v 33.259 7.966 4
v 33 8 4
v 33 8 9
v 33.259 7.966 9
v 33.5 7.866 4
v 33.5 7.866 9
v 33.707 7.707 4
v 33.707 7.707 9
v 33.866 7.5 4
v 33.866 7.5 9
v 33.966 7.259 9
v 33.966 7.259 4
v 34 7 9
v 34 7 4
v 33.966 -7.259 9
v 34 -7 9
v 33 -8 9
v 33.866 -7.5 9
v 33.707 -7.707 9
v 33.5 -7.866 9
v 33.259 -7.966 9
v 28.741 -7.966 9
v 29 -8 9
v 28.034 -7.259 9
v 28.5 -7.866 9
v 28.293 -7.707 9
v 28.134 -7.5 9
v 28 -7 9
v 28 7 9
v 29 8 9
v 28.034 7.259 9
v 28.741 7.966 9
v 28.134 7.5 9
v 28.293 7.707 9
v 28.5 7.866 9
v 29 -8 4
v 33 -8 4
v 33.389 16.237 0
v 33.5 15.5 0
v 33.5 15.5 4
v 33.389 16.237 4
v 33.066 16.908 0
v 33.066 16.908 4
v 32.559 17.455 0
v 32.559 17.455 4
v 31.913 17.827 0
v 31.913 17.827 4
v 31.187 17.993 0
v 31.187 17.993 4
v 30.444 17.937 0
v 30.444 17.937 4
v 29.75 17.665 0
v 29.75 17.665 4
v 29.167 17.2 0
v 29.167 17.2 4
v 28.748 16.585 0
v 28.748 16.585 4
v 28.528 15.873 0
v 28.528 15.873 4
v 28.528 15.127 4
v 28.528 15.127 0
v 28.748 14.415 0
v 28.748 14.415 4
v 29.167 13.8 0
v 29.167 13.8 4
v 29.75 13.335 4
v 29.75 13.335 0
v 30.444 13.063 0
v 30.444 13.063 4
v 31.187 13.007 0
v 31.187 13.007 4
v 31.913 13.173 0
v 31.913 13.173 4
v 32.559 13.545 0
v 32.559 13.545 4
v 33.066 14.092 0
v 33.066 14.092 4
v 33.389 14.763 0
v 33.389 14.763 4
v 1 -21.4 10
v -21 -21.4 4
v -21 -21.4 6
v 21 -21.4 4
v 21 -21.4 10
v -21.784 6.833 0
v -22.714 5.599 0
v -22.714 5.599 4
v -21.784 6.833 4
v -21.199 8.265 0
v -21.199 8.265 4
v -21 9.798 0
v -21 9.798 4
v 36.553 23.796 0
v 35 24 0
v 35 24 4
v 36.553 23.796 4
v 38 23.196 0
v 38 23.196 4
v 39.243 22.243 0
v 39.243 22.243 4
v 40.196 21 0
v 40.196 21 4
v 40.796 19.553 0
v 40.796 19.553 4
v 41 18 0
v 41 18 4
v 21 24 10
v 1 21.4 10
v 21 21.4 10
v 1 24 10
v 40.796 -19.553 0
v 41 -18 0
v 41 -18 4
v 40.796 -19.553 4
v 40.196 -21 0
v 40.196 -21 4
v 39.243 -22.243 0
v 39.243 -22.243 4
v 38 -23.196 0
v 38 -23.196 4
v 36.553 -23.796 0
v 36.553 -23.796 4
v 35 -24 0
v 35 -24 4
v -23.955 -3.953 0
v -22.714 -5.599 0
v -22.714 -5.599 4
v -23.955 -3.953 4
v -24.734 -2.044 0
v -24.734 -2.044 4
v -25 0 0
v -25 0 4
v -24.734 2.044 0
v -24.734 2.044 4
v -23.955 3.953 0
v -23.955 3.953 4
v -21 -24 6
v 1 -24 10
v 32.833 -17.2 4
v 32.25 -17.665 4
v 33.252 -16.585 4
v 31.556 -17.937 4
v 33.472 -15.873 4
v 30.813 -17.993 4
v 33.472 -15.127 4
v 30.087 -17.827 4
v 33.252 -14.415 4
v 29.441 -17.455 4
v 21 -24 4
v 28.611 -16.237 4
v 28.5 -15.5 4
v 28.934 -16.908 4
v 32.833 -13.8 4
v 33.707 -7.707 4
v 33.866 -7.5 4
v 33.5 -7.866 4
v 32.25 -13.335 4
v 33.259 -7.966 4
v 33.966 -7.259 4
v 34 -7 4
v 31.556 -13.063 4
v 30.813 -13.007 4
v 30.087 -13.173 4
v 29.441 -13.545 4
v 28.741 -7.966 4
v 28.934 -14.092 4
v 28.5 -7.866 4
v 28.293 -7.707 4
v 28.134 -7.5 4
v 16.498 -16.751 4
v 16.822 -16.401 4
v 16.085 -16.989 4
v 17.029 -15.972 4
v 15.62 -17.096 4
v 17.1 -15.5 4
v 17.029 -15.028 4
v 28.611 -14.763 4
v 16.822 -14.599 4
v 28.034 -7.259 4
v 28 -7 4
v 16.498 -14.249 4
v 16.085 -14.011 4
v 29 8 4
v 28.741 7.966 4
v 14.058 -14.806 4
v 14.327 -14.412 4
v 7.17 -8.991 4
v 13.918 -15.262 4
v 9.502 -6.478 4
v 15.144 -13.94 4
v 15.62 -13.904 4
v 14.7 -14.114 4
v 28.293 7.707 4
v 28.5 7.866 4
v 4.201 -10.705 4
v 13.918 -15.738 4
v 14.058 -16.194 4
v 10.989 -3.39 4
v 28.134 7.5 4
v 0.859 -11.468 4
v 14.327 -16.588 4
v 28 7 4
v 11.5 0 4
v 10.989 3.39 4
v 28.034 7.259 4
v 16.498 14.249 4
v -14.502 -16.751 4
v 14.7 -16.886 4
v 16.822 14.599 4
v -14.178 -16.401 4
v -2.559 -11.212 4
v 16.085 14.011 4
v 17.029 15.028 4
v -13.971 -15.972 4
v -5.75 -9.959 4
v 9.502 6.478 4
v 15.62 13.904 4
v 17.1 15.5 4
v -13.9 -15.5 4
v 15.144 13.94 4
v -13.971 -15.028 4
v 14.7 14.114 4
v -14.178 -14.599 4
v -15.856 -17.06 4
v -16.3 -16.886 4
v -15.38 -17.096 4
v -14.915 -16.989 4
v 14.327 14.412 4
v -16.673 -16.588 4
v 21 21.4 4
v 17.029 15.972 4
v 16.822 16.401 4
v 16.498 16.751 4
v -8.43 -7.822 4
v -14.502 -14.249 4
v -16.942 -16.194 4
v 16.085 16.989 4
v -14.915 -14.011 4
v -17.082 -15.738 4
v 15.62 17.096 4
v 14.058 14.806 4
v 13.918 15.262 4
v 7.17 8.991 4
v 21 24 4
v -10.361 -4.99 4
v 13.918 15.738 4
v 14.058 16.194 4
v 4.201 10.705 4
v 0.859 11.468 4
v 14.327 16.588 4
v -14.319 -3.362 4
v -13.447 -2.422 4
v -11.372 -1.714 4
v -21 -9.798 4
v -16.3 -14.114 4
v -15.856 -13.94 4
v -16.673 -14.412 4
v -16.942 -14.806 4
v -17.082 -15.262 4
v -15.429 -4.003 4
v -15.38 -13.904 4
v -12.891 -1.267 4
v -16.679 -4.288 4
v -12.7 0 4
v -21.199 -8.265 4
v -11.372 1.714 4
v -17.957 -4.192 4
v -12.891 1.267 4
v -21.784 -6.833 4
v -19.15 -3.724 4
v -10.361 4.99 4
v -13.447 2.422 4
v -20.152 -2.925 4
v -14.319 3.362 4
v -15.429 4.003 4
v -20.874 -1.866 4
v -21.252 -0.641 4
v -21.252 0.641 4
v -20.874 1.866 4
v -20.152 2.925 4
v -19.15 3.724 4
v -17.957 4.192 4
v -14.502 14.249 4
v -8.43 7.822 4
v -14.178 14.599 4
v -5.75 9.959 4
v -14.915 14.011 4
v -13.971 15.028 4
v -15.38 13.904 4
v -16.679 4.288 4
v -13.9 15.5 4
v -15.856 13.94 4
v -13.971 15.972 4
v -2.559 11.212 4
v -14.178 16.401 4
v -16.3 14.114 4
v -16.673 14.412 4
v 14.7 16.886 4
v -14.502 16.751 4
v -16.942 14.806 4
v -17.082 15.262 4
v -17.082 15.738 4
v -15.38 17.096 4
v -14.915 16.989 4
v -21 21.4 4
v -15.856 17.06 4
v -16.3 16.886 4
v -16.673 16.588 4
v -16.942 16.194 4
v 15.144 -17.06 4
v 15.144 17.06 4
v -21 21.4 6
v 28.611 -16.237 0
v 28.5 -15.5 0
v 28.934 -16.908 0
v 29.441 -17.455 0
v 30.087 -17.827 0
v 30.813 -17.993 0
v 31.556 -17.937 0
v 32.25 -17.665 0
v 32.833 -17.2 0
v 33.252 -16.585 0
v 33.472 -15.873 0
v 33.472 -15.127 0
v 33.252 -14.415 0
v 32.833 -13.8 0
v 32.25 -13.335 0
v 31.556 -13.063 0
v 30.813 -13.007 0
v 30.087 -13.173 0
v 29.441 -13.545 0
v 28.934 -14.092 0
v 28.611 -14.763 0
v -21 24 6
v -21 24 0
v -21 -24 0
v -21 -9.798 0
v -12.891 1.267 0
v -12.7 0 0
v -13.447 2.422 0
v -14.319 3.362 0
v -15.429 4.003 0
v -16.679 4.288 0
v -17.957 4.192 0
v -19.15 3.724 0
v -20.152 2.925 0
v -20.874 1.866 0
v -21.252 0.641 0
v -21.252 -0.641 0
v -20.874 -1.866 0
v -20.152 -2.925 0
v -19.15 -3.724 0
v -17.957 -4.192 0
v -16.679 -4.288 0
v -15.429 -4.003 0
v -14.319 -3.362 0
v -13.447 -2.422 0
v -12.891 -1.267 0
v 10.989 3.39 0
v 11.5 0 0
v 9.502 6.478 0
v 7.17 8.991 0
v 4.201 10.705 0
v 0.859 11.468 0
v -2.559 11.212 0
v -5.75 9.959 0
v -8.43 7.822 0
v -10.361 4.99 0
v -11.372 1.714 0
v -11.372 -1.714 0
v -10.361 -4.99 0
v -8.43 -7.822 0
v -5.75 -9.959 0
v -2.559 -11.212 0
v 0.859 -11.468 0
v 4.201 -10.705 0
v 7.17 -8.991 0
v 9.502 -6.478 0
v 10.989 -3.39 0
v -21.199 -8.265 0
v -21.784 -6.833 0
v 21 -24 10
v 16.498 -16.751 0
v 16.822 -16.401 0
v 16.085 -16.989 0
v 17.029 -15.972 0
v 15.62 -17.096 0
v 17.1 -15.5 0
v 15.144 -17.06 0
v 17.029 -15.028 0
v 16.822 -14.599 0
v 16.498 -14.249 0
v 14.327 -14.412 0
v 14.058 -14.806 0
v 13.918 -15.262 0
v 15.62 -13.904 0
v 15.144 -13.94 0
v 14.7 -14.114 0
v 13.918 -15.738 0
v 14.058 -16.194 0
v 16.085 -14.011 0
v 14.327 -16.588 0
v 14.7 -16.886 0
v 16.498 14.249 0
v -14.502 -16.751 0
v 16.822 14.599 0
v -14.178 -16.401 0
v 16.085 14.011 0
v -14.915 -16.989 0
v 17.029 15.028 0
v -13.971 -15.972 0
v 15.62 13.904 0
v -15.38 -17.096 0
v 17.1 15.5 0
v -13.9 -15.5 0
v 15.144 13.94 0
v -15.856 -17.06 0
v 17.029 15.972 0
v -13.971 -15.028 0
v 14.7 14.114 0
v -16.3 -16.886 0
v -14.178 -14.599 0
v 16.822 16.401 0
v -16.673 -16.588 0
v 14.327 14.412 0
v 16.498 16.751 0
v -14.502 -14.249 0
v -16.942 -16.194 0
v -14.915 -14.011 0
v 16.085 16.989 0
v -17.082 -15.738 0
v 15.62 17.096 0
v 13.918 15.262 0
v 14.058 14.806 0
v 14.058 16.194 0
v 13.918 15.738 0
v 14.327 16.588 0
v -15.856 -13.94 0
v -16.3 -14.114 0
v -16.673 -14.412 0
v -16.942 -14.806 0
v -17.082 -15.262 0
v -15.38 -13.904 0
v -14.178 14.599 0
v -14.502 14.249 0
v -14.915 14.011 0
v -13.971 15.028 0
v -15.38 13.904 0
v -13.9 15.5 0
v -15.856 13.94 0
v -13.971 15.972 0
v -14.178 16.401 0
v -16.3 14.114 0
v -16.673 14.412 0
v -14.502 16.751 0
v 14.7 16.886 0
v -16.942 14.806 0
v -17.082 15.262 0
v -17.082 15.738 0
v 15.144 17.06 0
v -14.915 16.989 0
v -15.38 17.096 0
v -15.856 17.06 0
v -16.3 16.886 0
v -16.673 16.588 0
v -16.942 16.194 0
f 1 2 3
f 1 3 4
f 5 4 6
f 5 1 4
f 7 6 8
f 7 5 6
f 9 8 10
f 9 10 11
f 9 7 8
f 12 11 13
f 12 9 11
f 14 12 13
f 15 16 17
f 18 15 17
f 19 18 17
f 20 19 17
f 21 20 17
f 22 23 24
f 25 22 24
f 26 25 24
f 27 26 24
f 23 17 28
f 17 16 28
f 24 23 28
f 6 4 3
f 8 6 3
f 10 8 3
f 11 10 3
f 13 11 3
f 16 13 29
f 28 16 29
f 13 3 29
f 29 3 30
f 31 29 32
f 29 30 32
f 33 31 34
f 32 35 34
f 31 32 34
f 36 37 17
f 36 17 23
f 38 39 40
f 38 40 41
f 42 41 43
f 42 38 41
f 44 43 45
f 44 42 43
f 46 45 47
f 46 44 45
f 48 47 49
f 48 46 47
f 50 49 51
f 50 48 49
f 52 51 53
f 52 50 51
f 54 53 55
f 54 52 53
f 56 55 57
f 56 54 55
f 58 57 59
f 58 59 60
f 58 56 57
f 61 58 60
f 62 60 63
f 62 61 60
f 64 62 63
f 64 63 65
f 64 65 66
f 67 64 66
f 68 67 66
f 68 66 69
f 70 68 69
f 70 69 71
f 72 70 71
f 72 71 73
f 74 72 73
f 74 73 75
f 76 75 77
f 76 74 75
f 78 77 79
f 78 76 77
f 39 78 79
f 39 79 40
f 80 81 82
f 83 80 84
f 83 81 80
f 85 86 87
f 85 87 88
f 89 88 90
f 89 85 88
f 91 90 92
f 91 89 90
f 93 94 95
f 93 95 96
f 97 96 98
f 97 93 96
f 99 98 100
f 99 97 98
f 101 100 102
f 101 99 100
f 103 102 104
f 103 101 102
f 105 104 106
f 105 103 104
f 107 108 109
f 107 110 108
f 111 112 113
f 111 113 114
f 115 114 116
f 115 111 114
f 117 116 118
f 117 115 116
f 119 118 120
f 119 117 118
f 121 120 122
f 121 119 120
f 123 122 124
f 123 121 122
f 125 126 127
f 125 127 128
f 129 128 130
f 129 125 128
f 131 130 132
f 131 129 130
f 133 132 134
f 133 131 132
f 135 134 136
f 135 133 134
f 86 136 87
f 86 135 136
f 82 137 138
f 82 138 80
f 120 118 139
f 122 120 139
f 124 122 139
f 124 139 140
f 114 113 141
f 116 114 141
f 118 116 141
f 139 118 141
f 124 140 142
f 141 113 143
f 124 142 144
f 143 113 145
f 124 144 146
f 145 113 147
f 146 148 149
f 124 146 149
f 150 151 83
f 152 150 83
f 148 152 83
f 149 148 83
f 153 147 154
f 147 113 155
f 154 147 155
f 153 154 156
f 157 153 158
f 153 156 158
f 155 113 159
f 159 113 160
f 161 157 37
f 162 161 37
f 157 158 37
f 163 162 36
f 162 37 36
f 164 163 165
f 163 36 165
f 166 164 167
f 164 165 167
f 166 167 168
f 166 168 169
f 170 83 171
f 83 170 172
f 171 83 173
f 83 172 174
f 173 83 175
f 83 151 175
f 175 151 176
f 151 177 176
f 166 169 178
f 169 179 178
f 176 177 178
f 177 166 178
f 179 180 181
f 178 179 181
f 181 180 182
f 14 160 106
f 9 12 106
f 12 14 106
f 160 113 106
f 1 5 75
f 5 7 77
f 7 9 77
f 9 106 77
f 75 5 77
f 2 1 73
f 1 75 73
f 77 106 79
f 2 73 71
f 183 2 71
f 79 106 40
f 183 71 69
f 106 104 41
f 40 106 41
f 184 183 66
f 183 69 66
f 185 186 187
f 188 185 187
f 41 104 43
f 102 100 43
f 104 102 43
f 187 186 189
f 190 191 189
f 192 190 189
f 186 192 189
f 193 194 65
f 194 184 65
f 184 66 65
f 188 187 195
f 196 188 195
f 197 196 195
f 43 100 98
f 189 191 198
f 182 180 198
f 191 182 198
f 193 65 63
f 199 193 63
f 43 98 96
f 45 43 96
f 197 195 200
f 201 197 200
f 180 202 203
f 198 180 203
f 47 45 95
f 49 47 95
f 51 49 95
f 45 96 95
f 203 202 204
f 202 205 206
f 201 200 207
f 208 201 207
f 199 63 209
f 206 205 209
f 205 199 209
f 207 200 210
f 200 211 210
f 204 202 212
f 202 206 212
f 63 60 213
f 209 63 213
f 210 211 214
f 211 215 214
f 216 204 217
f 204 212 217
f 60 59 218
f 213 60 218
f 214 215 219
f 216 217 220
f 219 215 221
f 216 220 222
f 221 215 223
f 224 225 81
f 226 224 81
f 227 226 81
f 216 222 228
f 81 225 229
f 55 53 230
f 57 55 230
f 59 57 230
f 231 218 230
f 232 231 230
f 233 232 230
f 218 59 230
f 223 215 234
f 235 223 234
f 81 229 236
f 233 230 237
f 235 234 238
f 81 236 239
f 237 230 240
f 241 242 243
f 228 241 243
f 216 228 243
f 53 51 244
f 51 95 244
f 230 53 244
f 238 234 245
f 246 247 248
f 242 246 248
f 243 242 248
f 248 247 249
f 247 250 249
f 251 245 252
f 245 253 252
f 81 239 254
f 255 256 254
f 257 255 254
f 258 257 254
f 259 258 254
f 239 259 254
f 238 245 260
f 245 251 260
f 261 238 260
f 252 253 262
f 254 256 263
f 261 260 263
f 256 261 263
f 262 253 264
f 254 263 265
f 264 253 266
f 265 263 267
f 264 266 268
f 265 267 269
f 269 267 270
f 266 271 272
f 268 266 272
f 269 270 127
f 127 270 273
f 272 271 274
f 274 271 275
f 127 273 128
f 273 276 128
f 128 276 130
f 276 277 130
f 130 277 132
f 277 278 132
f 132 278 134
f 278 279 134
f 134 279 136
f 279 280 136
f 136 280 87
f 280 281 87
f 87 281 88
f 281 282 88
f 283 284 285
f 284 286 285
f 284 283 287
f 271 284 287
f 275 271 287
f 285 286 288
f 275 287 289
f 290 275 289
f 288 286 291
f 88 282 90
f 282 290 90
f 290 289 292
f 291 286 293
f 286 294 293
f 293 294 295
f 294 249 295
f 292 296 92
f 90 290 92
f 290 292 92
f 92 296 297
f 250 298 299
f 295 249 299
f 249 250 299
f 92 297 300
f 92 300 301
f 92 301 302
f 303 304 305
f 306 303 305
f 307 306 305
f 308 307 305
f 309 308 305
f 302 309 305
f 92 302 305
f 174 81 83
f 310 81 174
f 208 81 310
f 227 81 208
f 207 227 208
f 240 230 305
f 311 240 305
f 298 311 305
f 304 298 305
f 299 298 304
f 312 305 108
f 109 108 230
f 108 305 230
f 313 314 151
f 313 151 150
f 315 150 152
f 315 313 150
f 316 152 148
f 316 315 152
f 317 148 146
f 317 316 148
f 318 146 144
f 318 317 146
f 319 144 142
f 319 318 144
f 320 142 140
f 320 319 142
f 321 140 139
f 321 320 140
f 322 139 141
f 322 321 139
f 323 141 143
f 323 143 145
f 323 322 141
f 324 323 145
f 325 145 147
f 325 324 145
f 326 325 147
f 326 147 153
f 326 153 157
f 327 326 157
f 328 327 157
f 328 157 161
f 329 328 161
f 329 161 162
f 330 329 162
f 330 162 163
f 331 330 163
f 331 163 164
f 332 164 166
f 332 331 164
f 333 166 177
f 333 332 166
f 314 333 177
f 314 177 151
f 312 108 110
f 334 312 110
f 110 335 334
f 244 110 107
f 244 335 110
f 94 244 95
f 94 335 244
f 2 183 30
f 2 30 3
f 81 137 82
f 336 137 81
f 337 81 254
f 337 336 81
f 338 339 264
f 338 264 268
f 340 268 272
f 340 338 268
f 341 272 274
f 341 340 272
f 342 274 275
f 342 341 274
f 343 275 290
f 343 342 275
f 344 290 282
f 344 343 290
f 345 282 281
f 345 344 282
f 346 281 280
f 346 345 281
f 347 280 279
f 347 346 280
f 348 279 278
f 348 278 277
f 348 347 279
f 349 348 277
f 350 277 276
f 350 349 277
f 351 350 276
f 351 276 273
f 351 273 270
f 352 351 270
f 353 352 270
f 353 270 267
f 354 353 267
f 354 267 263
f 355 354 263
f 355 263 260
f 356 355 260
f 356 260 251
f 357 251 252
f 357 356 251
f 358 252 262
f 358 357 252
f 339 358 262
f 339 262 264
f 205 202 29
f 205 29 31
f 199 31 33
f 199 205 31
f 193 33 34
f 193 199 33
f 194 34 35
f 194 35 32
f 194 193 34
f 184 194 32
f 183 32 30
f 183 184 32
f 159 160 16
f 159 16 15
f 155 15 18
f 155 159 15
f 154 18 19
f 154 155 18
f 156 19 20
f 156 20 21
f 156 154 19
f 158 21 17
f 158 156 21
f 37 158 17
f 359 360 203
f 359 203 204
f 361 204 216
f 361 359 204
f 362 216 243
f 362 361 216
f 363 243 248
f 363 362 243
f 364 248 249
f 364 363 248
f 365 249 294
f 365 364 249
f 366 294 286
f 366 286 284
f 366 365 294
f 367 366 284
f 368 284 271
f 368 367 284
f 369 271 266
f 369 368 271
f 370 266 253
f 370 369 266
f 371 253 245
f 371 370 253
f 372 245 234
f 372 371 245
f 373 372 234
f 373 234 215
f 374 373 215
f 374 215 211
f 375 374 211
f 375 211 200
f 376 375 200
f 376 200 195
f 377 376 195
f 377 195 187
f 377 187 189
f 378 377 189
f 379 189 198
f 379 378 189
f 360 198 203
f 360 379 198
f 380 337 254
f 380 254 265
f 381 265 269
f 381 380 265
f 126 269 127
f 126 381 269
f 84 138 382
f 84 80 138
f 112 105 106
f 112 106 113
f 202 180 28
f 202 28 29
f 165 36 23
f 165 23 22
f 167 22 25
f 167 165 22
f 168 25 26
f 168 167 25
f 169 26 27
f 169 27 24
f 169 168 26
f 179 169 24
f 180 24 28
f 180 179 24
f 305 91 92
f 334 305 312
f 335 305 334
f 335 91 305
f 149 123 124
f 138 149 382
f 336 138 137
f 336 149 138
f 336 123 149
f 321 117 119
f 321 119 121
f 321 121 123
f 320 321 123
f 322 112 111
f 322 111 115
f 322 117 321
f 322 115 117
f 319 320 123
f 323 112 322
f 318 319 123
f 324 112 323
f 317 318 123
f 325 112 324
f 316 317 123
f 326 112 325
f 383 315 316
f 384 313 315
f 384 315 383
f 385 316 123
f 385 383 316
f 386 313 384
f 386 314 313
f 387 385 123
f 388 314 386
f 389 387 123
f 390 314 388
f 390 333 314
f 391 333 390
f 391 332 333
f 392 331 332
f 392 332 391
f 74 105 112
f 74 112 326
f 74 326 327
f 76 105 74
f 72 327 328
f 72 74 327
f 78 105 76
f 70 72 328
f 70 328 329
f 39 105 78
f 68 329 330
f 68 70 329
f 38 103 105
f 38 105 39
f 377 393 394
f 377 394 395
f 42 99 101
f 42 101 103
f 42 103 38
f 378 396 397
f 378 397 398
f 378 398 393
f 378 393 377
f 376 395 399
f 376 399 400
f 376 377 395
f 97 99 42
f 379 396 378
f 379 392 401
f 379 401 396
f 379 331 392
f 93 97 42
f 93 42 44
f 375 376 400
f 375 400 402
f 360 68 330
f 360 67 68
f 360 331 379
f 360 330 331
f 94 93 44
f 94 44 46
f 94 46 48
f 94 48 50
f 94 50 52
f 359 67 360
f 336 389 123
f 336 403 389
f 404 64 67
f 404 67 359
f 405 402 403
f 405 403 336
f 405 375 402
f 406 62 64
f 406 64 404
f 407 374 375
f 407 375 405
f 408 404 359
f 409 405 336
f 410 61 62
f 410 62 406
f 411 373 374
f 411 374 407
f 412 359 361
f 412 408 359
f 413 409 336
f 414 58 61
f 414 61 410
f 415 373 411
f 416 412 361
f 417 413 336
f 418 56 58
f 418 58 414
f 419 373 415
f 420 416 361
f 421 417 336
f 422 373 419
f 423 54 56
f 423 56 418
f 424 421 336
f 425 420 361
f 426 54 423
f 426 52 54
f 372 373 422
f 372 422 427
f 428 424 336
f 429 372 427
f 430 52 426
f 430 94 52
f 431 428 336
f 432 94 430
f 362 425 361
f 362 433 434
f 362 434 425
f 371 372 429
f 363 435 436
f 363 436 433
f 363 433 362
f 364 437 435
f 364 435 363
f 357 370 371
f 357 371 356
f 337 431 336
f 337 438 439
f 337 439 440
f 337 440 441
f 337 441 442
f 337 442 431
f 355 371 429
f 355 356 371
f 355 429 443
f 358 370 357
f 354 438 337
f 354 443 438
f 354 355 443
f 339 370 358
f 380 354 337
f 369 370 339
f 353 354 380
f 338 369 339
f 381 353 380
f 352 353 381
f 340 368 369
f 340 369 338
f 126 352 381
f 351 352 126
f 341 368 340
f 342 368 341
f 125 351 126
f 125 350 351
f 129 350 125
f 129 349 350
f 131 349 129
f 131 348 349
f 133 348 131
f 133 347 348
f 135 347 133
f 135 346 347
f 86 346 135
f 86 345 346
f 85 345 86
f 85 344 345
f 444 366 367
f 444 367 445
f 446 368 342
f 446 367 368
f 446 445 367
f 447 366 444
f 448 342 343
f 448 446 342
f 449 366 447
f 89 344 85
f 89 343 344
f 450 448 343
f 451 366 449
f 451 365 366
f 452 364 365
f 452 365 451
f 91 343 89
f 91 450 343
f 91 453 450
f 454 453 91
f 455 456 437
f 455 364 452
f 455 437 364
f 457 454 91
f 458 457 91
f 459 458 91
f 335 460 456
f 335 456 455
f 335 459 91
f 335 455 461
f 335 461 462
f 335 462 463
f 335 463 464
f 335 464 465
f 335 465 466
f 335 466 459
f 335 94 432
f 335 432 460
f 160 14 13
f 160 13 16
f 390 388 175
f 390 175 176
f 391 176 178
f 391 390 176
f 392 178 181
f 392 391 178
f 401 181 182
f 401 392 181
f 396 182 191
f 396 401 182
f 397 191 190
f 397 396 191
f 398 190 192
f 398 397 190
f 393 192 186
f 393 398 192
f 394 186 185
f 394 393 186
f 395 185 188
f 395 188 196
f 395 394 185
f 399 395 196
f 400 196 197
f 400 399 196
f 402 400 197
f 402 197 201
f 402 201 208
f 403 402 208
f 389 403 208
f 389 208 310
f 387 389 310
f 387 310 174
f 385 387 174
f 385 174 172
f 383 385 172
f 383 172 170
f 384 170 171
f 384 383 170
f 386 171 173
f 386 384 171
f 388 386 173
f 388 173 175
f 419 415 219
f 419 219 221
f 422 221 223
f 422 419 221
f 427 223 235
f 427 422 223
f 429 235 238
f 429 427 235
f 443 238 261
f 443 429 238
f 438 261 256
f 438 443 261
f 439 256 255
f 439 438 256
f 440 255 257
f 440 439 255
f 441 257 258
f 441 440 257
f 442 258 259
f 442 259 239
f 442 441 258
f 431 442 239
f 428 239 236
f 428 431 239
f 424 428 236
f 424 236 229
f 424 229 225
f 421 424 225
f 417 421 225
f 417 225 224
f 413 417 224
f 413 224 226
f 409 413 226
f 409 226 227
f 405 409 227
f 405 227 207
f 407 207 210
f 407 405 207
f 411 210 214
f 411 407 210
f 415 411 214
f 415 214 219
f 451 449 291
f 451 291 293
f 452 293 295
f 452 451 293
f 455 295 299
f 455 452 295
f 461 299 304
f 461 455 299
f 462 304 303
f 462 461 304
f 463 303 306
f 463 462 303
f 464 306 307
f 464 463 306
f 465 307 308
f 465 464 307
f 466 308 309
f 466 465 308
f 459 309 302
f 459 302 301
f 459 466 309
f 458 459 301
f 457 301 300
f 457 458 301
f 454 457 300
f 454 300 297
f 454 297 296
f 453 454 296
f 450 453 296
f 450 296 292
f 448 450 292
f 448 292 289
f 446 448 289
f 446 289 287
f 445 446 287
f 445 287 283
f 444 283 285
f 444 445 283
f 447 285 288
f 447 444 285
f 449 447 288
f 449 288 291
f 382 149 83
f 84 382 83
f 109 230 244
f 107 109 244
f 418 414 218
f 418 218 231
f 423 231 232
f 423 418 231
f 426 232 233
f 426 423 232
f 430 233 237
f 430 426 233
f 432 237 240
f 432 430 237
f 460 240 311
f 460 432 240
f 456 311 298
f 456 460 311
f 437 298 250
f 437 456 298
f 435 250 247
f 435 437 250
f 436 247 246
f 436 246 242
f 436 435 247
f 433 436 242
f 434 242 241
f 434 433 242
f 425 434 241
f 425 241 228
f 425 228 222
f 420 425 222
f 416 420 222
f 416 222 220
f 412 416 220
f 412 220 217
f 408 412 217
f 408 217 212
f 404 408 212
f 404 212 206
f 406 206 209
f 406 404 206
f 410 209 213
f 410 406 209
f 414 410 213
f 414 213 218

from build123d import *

# Parameters (mm, degrees)
SKETCH_1_R      = 11.5
SKETCH_1_R_2    = 1.6
SKETCH_1_R_3    = 4.3
SKETCH_1_R_4    = 2.5
EXTRUDE_3_DEPTH = 4
SKETCH_4_W      = 42
SKETCH_4_H      = 2.6
EXTRUDE_4_DEPTH = 6
EXTRUDE_5_DEPTH = 5
CHAMFER_3_SIZE  = 4
CHAMFER_3_SIZE2 = 22
CHAMFER_4_SIZE  = 22
CHAMFER_4_SIZE2 = 4


with BuildPart() as part:
    # 草图1 → 凸台-拉伸3 (new body)
    with BuildSketch(Plane.XY):
        with BuildLine():
            Line((-21, 24), (35, 24))
            ThreePointArc((35, 24), (39.242640687, 22.242640687), (41, 18))
            Line((41, 18), (41, -18))
            ThreePointArc((41, -18), (39.242640687, -22.242640687), (35, -24))
            Line((35, -24), (-21, -24))
            Line((-21, -24), (-21, -9.797958971))
            ThreePointArc((-21, -9.797958971), (-21.445079401, -7.530172133), (-22.714285714, -5.598833698))
            ThreePointArc((-22.714285714, -5.598833698), (-25, 0), (-22.714285714, 5.598833698))
            ThreePointArc((-22.714285714, 5.598833698), (-21.445079401, 7.530172133), (-21, 9.797958971))
            Line((-21, 9.797958971), (-21, 24))
        make_face()
        Circle(SKETCH_1_R, mode=Mode.SUBTRACT)
        with Locations((15.5, 15.5)):
            Circle(SKETCH_1_R_2, mode=Mode.SUBTRACT)
        with Locations((15.5, -15.5)):
            Circle(SKETCH_1_R_2, mode=Mode.SUBTRACT)
        with Locations((-15.5, -15.5)):
            Circle(SKETCH_1_R_2, mode=Mode.SUBTRACT)
        with Locations((-15.5, 15.5)):
            Circle(SKETCH_1_R_2, mode=Mode.SUBTRACT)
        with Locations((-17, 0)):
            Circle(SKETCH_1_R_3, mode=Mode.SUBTRACT)
        with Locations((31, 15.5)):
            Circle(SKETCH_1_R_4, mode=Mode.SUBTRACT)
        with Locations((31, -15.5)):
            Circle(SKETCH_1_R_4, mode=Mode.SUBTRACT)
    extrude(amount=EXTRUDE_3_DEPTH)

    # 草图4 → 凸台-拉伸4 (add)
    with BuildSketch(Plane.XY.offset(4)):
        with Locations((0, 22.7)):
            Rectangle(SKETCH_4_W, SKETCH_4_H)
        with Locations((0, -22.7)):
            Rectangle(SKETCH_4_W, SKETCH_4_H)
    extrude(amount=EXTRUDE_4_DEPTH)

    # 草图4<3> → 凸台-拉伸5 (add)
    with BuildSketch(Plane.XY.offset(4)):
        with BuildLine():
            Line((28, 7), (28, -7))
            ThreePointArc((28, -7), (28.292893219, -7.707106781), (29, -8))
            Line((29, -8), (33, -8))
            ThreePointArc((33, -8), (33.707106781, -7.707106781), (34, -7))
            Line((34, -7), (34, 7))
            ThreePointArc((34, 7), (33.707106781, 7.707106781), (33, 8))
            Line((33, 8), (29, 8))
            ThreePointArc((29, 8), (28.292893219, 7.707106781), (28, 7))
        make_face()
    extrude(amount=EXTRUDE_5_DEPTH)

    # 倒角3
    chamfer_3_edges = [part.edges().sort_by_distance(p)[0] for p in [
        (-21, 22.7, 10),
    ]]
    chamfer_3_side = [part.faces().sort_by_distance(p)[0] for p in [
        (-21, 18.1487822, 3.077226594),
    ]]
    chamfer(chamfer_3_edges, length=CHAMFER_3_SIZE, length2=CHAMFER_3_SIZE2, reference=chamfer_3_side[0])

    # 倒角4
    chamfer_4_edges = [part.edges().sort_by_distance(p)[0] for p in [
        (-21, -22.7, 10),
    ]]
    chamfer_4_side = [part.faces().sort_by_distance(p)[0] for p in [
        (0, -22.7, 10),
    ]]
    chamfer(chamfer_4_edges, length=CHAMFER_4_SIZE, length2=CHAMFER_4_SIZE2, reference=chamfer_4_side[0])


solid = part.part
